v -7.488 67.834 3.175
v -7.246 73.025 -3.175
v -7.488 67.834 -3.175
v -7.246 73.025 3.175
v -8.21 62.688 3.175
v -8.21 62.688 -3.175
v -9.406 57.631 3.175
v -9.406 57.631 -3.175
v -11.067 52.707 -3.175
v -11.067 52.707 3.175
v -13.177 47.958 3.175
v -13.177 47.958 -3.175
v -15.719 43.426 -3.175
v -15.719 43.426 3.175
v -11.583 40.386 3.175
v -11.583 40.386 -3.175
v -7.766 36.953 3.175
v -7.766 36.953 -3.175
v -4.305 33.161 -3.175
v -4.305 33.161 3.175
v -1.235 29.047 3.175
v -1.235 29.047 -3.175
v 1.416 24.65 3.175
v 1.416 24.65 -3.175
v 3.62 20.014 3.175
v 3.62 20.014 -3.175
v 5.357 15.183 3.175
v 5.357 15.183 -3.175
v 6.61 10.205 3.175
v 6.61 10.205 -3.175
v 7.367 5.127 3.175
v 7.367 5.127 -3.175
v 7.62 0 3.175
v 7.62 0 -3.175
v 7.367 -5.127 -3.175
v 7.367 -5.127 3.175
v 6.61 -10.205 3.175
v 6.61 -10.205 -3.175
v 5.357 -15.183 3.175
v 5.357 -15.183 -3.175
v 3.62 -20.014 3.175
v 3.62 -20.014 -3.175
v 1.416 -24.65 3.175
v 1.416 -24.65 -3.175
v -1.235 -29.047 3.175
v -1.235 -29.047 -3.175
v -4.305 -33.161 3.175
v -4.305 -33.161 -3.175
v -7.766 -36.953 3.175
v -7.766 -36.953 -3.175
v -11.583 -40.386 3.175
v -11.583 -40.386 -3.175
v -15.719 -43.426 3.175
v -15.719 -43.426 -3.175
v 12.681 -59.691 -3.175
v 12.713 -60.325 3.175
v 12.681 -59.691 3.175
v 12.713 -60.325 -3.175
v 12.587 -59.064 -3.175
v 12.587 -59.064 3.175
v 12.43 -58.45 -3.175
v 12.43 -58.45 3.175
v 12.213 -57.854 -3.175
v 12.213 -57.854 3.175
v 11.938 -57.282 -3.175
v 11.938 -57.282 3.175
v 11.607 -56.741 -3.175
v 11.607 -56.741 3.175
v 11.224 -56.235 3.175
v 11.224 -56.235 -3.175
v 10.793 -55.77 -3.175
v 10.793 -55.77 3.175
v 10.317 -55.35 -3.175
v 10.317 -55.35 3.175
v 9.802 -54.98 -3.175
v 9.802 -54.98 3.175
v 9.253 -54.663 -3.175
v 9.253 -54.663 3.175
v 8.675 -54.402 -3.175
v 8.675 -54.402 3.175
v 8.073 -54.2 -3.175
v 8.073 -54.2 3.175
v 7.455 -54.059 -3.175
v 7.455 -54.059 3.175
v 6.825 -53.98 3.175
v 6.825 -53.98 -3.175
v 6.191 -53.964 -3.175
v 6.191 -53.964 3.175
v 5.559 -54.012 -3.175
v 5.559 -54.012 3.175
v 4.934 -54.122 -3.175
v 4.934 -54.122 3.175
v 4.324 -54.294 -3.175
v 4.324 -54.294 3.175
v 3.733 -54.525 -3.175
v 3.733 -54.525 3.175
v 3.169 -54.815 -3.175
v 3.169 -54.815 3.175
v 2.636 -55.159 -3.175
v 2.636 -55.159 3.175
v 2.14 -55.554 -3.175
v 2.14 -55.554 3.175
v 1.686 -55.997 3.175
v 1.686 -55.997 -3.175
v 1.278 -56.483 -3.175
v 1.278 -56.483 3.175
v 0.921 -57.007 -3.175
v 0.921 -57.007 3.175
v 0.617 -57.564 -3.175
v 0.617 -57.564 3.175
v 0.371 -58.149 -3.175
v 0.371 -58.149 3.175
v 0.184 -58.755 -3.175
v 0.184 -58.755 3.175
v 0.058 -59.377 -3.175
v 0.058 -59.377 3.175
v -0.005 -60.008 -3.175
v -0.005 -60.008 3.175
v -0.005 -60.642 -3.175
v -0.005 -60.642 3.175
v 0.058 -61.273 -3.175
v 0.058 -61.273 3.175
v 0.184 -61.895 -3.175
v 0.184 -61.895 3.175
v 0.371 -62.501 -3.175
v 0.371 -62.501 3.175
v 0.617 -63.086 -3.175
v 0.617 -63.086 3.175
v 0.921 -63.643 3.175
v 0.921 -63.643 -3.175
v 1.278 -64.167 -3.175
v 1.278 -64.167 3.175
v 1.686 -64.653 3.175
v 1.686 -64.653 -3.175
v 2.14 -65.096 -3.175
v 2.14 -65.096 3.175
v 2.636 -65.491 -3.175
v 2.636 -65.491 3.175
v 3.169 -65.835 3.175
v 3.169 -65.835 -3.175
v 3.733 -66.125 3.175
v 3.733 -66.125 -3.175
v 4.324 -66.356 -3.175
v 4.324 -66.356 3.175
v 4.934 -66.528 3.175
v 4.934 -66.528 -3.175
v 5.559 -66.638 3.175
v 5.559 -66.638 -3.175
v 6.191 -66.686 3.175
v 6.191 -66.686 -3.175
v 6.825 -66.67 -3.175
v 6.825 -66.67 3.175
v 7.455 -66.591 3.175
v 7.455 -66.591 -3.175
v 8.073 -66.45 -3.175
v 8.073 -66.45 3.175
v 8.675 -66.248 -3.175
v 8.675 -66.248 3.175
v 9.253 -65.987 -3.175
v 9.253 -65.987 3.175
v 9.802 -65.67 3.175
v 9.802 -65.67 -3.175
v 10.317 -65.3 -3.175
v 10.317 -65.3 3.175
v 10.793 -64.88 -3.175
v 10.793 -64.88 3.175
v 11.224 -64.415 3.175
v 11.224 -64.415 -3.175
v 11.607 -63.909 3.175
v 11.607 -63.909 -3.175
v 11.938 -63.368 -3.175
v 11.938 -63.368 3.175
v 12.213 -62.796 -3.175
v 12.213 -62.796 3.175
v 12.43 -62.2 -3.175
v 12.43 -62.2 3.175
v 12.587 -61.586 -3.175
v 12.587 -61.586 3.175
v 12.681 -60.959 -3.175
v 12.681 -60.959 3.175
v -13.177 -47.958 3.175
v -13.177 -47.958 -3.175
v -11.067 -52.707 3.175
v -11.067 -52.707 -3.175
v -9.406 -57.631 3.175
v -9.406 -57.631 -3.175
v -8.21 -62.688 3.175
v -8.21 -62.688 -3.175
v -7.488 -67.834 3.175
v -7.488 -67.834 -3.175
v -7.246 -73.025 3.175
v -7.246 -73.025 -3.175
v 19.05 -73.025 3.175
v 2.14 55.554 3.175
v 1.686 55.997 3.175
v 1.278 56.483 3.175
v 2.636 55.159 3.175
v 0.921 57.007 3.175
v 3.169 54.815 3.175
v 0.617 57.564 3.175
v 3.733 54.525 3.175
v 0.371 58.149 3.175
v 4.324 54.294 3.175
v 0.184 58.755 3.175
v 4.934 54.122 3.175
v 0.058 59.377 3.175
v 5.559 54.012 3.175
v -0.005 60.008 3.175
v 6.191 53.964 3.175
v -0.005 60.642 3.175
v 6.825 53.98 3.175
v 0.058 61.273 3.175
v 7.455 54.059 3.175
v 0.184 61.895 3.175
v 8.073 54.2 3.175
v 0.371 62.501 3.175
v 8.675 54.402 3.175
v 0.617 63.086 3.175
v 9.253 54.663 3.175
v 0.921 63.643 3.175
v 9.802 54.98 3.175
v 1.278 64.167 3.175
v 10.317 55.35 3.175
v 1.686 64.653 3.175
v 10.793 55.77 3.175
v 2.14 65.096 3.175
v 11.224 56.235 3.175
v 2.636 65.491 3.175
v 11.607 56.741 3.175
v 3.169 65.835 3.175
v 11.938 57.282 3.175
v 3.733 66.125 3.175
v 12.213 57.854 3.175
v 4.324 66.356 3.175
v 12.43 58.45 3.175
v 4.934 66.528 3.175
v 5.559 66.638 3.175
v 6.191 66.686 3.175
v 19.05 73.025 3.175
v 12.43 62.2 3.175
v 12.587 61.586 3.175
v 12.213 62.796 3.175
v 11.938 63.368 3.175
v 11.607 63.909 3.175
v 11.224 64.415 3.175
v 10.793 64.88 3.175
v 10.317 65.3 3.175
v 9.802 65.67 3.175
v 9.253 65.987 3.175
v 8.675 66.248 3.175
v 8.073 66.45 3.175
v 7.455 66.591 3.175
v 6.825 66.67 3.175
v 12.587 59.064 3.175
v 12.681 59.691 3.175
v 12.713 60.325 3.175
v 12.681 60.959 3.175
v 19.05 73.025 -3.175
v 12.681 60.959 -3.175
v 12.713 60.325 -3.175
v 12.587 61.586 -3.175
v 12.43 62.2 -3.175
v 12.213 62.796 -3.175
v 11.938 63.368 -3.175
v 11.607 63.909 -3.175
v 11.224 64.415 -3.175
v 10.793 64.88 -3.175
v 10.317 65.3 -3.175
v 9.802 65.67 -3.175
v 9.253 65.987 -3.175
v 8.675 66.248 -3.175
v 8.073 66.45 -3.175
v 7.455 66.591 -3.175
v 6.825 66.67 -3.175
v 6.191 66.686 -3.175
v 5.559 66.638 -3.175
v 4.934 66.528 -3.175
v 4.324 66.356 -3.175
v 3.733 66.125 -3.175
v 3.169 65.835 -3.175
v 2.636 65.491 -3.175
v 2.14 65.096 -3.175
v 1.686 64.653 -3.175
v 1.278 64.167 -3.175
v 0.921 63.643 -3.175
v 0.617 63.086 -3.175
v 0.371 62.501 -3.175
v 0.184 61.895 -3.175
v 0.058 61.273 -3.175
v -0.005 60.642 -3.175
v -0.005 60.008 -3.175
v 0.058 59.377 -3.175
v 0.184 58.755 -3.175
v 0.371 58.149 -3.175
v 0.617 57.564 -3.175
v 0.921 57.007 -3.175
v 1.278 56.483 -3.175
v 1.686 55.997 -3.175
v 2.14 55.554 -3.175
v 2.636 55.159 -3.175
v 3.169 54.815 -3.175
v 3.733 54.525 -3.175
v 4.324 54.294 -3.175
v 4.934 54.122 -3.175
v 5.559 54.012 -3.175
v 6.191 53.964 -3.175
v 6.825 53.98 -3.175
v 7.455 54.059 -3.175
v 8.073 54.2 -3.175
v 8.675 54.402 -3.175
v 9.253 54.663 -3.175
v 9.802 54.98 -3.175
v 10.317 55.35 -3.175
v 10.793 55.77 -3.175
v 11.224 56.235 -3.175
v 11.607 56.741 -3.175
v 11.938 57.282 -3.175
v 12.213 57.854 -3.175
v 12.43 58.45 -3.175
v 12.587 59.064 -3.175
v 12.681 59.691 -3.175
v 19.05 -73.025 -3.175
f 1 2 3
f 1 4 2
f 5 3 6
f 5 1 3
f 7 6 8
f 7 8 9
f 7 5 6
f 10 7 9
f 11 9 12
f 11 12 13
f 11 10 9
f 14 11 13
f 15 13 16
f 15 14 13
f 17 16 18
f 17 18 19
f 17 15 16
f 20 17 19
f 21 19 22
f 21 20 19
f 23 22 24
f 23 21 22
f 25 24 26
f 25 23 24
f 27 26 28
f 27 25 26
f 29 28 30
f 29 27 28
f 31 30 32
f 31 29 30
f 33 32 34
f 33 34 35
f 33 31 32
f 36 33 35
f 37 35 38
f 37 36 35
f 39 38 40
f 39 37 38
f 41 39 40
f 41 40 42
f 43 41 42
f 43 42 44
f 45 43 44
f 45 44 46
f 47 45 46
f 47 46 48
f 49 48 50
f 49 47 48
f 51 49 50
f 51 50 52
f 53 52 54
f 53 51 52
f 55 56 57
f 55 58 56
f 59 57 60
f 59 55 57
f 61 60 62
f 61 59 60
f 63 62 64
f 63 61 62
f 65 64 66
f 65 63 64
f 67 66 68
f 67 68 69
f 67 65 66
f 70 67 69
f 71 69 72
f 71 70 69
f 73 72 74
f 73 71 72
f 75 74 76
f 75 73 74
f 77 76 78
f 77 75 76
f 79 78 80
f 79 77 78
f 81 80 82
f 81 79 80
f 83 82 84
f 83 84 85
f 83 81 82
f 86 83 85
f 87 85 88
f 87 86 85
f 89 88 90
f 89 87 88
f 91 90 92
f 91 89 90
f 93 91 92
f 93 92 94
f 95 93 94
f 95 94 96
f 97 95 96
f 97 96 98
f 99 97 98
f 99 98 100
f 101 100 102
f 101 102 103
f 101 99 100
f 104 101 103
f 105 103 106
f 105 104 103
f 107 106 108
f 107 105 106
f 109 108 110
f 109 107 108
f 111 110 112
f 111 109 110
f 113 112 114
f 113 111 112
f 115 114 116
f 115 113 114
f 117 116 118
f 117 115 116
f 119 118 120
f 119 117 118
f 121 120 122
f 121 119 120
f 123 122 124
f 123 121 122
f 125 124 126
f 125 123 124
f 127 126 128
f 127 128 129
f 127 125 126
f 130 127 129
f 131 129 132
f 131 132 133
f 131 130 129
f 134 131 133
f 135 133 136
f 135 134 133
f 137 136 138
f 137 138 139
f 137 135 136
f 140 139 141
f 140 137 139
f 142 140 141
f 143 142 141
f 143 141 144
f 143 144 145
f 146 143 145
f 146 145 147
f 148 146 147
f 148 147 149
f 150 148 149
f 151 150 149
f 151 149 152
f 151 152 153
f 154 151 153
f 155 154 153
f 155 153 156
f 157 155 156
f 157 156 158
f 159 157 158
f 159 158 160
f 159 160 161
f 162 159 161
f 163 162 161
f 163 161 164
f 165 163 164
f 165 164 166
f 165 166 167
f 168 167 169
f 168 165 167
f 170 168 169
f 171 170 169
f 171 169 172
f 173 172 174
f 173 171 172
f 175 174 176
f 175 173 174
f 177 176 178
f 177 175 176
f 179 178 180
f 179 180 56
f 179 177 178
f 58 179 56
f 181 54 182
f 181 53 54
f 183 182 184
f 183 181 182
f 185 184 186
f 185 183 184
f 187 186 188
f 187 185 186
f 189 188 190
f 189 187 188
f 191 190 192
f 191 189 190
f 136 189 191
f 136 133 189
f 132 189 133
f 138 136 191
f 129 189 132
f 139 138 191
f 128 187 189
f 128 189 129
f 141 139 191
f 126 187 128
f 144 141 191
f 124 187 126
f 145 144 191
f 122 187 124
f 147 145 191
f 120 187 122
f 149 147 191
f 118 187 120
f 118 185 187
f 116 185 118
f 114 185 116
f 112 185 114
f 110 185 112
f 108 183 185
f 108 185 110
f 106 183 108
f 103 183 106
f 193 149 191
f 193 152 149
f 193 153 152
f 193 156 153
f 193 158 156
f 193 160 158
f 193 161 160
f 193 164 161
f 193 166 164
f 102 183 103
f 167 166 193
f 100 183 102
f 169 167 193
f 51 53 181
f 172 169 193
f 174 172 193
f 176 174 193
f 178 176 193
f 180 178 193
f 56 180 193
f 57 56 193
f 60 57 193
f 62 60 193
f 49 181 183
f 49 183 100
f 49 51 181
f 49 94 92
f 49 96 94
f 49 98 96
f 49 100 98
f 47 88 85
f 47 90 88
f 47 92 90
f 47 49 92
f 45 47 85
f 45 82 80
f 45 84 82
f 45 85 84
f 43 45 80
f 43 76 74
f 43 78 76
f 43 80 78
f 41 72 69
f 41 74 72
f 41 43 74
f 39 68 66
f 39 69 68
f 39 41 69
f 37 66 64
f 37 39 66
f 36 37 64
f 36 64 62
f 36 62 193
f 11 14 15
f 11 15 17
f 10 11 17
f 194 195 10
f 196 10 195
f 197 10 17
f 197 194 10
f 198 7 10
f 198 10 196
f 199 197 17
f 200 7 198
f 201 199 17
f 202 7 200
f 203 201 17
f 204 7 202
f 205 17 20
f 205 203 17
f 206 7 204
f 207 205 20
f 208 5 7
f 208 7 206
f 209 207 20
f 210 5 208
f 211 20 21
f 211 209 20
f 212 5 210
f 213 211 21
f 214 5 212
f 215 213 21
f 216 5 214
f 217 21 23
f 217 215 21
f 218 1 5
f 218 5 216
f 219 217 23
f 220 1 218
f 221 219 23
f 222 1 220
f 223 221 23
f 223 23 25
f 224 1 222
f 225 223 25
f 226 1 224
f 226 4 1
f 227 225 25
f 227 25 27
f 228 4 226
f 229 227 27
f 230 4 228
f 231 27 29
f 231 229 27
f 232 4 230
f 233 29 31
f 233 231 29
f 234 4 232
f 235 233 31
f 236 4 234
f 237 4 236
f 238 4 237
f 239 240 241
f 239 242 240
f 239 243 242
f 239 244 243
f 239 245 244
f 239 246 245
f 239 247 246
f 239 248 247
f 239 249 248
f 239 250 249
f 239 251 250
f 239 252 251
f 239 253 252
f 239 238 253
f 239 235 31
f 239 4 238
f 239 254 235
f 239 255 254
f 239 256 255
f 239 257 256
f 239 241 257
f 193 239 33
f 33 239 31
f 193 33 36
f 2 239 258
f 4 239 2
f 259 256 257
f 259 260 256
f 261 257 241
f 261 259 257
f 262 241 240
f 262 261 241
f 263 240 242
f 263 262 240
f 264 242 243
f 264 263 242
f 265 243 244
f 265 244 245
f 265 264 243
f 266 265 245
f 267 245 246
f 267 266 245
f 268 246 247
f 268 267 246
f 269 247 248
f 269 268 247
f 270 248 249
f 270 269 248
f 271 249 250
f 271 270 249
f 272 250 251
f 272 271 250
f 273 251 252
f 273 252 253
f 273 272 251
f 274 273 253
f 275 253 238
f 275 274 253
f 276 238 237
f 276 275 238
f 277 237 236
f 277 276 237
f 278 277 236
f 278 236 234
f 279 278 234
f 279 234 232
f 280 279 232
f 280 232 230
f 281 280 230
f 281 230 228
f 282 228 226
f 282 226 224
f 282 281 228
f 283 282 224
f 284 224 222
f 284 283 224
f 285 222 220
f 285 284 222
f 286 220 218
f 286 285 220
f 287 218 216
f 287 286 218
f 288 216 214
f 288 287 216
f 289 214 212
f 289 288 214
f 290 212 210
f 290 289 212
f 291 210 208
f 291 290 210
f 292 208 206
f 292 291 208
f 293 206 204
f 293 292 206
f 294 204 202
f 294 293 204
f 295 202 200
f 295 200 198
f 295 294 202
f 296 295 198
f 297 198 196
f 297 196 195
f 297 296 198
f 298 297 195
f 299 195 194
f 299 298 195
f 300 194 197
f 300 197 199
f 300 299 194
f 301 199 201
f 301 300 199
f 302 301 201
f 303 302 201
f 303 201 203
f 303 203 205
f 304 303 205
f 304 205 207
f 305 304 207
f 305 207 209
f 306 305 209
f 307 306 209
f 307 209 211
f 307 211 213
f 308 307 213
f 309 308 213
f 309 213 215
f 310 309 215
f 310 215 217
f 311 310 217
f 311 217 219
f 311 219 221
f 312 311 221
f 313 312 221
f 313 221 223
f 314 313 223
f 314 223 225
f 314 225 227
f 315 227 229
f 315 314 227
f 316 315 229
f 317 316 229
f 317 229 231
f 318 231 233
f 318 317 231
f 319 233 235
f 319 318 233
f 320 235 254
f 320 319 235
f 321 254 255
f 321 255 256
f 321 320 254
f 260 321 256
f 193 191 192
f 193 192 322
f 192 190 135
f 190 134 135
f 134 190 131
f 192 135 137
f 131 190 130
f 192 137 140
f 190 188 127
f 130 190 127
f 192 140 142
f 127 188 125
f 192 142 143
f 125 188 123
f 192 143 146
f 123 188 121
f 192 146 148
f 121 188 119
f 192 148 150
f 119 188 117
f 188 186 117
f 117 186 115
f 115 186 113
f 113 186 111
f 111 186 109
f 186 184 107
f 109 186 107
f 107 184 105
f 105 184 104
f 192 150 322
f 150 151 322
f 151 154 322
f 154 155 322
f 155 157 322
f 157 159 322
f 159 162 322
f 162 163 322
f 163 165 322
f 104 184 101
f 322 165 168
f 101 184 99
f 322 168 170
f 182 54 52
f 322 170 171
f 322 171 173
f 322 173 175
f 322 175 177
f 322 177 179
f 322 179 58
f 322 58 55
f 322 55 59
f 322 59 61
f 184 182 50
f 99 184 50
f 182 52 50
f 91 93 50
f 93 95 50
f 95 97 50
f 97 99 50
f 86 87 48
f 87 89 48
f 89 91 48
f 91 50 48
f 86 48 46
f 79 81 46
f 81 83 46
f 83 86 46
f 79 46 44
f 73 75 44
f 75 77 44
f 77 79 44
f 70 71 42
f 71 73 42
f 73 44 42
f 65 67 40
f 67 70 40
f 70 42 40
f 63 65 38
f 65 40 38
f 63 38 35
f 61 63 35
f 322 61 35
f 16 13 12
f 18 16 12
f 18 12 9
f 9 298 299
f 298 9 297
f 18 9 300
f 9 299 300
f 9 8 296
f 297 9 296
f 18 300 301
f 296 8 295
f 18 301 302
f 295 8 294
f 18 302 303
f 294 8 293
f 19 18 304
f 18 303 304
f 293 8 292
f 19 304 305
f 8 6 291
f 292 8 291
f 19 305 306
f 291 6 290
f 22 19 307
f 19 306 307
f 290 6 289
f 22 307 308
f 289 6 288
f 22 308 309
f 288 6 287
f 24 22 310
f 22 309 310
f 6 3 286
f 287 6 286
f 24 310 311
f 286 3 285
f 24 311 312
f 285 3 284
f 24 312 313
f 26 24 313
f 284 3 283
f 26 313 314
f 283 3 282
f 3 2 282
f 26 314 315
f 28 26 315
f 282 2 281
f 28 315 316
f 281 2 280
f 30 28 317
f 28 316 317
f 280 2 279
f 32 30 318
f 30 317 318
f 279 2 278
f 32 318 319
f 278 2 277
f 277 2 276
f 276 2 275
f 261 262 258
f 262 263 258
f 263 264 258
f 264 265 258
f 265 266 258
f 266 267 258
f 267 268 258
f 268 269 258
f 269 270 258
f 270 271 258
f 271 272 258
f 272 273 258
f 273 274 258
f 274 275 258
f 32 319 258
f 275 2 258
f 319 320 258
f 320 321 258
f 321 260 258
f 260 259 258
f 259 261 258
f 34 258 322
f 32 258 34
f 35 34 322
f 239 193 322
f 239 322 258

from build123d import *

# Parameters (mm, degrees)
SKETCH1_R           = 6.3627
BOSS_EXTRUDE1_DEPTH = 3.175


with BuildPart() as part:
    # Sketch1 → Boss-Extrude1 (new body, symmetric)
    with BuildSketch(Plane.XY):
        with BuildLine():
            ThreePointArc((-15.719319348, -43.426177466), (-9.406121761, -57.631125381), (-7.246114065, -73.025))
            Line((-7.246114065, -73.025), (19.05, -73.025))
            Line((19.05, -73.025), (19.05, 73.025))
            Line((19.05, 73.025), (-7.246114065, 73.025))
            ThreePointArc((-7.246114065, 73.025), (-9.406121761, 57.631125381), (-15.719319348, 43.426177466))
            ThreePointArc((-15.719319348, 43.426177466), (1.415517775, 24.650338319), (7.62, 0))
            ThreePointArc((7.62, 0), (1.415517775, -24.650338319), (-15.719319348, -43.426177466))
        make_face()
        with Locations((6.35, -60.325)):
            Circle(SKETCH1_R, mode=Mode.SUBTRACT)
        with Locations((6.35, 60.325)):
            Circle(SKETCH1_R, mode=Mode.SUBTRACT)
    extrude(amount=BOSS_EXTRUDE1_DEPTH, both=True)


solid = part.part
